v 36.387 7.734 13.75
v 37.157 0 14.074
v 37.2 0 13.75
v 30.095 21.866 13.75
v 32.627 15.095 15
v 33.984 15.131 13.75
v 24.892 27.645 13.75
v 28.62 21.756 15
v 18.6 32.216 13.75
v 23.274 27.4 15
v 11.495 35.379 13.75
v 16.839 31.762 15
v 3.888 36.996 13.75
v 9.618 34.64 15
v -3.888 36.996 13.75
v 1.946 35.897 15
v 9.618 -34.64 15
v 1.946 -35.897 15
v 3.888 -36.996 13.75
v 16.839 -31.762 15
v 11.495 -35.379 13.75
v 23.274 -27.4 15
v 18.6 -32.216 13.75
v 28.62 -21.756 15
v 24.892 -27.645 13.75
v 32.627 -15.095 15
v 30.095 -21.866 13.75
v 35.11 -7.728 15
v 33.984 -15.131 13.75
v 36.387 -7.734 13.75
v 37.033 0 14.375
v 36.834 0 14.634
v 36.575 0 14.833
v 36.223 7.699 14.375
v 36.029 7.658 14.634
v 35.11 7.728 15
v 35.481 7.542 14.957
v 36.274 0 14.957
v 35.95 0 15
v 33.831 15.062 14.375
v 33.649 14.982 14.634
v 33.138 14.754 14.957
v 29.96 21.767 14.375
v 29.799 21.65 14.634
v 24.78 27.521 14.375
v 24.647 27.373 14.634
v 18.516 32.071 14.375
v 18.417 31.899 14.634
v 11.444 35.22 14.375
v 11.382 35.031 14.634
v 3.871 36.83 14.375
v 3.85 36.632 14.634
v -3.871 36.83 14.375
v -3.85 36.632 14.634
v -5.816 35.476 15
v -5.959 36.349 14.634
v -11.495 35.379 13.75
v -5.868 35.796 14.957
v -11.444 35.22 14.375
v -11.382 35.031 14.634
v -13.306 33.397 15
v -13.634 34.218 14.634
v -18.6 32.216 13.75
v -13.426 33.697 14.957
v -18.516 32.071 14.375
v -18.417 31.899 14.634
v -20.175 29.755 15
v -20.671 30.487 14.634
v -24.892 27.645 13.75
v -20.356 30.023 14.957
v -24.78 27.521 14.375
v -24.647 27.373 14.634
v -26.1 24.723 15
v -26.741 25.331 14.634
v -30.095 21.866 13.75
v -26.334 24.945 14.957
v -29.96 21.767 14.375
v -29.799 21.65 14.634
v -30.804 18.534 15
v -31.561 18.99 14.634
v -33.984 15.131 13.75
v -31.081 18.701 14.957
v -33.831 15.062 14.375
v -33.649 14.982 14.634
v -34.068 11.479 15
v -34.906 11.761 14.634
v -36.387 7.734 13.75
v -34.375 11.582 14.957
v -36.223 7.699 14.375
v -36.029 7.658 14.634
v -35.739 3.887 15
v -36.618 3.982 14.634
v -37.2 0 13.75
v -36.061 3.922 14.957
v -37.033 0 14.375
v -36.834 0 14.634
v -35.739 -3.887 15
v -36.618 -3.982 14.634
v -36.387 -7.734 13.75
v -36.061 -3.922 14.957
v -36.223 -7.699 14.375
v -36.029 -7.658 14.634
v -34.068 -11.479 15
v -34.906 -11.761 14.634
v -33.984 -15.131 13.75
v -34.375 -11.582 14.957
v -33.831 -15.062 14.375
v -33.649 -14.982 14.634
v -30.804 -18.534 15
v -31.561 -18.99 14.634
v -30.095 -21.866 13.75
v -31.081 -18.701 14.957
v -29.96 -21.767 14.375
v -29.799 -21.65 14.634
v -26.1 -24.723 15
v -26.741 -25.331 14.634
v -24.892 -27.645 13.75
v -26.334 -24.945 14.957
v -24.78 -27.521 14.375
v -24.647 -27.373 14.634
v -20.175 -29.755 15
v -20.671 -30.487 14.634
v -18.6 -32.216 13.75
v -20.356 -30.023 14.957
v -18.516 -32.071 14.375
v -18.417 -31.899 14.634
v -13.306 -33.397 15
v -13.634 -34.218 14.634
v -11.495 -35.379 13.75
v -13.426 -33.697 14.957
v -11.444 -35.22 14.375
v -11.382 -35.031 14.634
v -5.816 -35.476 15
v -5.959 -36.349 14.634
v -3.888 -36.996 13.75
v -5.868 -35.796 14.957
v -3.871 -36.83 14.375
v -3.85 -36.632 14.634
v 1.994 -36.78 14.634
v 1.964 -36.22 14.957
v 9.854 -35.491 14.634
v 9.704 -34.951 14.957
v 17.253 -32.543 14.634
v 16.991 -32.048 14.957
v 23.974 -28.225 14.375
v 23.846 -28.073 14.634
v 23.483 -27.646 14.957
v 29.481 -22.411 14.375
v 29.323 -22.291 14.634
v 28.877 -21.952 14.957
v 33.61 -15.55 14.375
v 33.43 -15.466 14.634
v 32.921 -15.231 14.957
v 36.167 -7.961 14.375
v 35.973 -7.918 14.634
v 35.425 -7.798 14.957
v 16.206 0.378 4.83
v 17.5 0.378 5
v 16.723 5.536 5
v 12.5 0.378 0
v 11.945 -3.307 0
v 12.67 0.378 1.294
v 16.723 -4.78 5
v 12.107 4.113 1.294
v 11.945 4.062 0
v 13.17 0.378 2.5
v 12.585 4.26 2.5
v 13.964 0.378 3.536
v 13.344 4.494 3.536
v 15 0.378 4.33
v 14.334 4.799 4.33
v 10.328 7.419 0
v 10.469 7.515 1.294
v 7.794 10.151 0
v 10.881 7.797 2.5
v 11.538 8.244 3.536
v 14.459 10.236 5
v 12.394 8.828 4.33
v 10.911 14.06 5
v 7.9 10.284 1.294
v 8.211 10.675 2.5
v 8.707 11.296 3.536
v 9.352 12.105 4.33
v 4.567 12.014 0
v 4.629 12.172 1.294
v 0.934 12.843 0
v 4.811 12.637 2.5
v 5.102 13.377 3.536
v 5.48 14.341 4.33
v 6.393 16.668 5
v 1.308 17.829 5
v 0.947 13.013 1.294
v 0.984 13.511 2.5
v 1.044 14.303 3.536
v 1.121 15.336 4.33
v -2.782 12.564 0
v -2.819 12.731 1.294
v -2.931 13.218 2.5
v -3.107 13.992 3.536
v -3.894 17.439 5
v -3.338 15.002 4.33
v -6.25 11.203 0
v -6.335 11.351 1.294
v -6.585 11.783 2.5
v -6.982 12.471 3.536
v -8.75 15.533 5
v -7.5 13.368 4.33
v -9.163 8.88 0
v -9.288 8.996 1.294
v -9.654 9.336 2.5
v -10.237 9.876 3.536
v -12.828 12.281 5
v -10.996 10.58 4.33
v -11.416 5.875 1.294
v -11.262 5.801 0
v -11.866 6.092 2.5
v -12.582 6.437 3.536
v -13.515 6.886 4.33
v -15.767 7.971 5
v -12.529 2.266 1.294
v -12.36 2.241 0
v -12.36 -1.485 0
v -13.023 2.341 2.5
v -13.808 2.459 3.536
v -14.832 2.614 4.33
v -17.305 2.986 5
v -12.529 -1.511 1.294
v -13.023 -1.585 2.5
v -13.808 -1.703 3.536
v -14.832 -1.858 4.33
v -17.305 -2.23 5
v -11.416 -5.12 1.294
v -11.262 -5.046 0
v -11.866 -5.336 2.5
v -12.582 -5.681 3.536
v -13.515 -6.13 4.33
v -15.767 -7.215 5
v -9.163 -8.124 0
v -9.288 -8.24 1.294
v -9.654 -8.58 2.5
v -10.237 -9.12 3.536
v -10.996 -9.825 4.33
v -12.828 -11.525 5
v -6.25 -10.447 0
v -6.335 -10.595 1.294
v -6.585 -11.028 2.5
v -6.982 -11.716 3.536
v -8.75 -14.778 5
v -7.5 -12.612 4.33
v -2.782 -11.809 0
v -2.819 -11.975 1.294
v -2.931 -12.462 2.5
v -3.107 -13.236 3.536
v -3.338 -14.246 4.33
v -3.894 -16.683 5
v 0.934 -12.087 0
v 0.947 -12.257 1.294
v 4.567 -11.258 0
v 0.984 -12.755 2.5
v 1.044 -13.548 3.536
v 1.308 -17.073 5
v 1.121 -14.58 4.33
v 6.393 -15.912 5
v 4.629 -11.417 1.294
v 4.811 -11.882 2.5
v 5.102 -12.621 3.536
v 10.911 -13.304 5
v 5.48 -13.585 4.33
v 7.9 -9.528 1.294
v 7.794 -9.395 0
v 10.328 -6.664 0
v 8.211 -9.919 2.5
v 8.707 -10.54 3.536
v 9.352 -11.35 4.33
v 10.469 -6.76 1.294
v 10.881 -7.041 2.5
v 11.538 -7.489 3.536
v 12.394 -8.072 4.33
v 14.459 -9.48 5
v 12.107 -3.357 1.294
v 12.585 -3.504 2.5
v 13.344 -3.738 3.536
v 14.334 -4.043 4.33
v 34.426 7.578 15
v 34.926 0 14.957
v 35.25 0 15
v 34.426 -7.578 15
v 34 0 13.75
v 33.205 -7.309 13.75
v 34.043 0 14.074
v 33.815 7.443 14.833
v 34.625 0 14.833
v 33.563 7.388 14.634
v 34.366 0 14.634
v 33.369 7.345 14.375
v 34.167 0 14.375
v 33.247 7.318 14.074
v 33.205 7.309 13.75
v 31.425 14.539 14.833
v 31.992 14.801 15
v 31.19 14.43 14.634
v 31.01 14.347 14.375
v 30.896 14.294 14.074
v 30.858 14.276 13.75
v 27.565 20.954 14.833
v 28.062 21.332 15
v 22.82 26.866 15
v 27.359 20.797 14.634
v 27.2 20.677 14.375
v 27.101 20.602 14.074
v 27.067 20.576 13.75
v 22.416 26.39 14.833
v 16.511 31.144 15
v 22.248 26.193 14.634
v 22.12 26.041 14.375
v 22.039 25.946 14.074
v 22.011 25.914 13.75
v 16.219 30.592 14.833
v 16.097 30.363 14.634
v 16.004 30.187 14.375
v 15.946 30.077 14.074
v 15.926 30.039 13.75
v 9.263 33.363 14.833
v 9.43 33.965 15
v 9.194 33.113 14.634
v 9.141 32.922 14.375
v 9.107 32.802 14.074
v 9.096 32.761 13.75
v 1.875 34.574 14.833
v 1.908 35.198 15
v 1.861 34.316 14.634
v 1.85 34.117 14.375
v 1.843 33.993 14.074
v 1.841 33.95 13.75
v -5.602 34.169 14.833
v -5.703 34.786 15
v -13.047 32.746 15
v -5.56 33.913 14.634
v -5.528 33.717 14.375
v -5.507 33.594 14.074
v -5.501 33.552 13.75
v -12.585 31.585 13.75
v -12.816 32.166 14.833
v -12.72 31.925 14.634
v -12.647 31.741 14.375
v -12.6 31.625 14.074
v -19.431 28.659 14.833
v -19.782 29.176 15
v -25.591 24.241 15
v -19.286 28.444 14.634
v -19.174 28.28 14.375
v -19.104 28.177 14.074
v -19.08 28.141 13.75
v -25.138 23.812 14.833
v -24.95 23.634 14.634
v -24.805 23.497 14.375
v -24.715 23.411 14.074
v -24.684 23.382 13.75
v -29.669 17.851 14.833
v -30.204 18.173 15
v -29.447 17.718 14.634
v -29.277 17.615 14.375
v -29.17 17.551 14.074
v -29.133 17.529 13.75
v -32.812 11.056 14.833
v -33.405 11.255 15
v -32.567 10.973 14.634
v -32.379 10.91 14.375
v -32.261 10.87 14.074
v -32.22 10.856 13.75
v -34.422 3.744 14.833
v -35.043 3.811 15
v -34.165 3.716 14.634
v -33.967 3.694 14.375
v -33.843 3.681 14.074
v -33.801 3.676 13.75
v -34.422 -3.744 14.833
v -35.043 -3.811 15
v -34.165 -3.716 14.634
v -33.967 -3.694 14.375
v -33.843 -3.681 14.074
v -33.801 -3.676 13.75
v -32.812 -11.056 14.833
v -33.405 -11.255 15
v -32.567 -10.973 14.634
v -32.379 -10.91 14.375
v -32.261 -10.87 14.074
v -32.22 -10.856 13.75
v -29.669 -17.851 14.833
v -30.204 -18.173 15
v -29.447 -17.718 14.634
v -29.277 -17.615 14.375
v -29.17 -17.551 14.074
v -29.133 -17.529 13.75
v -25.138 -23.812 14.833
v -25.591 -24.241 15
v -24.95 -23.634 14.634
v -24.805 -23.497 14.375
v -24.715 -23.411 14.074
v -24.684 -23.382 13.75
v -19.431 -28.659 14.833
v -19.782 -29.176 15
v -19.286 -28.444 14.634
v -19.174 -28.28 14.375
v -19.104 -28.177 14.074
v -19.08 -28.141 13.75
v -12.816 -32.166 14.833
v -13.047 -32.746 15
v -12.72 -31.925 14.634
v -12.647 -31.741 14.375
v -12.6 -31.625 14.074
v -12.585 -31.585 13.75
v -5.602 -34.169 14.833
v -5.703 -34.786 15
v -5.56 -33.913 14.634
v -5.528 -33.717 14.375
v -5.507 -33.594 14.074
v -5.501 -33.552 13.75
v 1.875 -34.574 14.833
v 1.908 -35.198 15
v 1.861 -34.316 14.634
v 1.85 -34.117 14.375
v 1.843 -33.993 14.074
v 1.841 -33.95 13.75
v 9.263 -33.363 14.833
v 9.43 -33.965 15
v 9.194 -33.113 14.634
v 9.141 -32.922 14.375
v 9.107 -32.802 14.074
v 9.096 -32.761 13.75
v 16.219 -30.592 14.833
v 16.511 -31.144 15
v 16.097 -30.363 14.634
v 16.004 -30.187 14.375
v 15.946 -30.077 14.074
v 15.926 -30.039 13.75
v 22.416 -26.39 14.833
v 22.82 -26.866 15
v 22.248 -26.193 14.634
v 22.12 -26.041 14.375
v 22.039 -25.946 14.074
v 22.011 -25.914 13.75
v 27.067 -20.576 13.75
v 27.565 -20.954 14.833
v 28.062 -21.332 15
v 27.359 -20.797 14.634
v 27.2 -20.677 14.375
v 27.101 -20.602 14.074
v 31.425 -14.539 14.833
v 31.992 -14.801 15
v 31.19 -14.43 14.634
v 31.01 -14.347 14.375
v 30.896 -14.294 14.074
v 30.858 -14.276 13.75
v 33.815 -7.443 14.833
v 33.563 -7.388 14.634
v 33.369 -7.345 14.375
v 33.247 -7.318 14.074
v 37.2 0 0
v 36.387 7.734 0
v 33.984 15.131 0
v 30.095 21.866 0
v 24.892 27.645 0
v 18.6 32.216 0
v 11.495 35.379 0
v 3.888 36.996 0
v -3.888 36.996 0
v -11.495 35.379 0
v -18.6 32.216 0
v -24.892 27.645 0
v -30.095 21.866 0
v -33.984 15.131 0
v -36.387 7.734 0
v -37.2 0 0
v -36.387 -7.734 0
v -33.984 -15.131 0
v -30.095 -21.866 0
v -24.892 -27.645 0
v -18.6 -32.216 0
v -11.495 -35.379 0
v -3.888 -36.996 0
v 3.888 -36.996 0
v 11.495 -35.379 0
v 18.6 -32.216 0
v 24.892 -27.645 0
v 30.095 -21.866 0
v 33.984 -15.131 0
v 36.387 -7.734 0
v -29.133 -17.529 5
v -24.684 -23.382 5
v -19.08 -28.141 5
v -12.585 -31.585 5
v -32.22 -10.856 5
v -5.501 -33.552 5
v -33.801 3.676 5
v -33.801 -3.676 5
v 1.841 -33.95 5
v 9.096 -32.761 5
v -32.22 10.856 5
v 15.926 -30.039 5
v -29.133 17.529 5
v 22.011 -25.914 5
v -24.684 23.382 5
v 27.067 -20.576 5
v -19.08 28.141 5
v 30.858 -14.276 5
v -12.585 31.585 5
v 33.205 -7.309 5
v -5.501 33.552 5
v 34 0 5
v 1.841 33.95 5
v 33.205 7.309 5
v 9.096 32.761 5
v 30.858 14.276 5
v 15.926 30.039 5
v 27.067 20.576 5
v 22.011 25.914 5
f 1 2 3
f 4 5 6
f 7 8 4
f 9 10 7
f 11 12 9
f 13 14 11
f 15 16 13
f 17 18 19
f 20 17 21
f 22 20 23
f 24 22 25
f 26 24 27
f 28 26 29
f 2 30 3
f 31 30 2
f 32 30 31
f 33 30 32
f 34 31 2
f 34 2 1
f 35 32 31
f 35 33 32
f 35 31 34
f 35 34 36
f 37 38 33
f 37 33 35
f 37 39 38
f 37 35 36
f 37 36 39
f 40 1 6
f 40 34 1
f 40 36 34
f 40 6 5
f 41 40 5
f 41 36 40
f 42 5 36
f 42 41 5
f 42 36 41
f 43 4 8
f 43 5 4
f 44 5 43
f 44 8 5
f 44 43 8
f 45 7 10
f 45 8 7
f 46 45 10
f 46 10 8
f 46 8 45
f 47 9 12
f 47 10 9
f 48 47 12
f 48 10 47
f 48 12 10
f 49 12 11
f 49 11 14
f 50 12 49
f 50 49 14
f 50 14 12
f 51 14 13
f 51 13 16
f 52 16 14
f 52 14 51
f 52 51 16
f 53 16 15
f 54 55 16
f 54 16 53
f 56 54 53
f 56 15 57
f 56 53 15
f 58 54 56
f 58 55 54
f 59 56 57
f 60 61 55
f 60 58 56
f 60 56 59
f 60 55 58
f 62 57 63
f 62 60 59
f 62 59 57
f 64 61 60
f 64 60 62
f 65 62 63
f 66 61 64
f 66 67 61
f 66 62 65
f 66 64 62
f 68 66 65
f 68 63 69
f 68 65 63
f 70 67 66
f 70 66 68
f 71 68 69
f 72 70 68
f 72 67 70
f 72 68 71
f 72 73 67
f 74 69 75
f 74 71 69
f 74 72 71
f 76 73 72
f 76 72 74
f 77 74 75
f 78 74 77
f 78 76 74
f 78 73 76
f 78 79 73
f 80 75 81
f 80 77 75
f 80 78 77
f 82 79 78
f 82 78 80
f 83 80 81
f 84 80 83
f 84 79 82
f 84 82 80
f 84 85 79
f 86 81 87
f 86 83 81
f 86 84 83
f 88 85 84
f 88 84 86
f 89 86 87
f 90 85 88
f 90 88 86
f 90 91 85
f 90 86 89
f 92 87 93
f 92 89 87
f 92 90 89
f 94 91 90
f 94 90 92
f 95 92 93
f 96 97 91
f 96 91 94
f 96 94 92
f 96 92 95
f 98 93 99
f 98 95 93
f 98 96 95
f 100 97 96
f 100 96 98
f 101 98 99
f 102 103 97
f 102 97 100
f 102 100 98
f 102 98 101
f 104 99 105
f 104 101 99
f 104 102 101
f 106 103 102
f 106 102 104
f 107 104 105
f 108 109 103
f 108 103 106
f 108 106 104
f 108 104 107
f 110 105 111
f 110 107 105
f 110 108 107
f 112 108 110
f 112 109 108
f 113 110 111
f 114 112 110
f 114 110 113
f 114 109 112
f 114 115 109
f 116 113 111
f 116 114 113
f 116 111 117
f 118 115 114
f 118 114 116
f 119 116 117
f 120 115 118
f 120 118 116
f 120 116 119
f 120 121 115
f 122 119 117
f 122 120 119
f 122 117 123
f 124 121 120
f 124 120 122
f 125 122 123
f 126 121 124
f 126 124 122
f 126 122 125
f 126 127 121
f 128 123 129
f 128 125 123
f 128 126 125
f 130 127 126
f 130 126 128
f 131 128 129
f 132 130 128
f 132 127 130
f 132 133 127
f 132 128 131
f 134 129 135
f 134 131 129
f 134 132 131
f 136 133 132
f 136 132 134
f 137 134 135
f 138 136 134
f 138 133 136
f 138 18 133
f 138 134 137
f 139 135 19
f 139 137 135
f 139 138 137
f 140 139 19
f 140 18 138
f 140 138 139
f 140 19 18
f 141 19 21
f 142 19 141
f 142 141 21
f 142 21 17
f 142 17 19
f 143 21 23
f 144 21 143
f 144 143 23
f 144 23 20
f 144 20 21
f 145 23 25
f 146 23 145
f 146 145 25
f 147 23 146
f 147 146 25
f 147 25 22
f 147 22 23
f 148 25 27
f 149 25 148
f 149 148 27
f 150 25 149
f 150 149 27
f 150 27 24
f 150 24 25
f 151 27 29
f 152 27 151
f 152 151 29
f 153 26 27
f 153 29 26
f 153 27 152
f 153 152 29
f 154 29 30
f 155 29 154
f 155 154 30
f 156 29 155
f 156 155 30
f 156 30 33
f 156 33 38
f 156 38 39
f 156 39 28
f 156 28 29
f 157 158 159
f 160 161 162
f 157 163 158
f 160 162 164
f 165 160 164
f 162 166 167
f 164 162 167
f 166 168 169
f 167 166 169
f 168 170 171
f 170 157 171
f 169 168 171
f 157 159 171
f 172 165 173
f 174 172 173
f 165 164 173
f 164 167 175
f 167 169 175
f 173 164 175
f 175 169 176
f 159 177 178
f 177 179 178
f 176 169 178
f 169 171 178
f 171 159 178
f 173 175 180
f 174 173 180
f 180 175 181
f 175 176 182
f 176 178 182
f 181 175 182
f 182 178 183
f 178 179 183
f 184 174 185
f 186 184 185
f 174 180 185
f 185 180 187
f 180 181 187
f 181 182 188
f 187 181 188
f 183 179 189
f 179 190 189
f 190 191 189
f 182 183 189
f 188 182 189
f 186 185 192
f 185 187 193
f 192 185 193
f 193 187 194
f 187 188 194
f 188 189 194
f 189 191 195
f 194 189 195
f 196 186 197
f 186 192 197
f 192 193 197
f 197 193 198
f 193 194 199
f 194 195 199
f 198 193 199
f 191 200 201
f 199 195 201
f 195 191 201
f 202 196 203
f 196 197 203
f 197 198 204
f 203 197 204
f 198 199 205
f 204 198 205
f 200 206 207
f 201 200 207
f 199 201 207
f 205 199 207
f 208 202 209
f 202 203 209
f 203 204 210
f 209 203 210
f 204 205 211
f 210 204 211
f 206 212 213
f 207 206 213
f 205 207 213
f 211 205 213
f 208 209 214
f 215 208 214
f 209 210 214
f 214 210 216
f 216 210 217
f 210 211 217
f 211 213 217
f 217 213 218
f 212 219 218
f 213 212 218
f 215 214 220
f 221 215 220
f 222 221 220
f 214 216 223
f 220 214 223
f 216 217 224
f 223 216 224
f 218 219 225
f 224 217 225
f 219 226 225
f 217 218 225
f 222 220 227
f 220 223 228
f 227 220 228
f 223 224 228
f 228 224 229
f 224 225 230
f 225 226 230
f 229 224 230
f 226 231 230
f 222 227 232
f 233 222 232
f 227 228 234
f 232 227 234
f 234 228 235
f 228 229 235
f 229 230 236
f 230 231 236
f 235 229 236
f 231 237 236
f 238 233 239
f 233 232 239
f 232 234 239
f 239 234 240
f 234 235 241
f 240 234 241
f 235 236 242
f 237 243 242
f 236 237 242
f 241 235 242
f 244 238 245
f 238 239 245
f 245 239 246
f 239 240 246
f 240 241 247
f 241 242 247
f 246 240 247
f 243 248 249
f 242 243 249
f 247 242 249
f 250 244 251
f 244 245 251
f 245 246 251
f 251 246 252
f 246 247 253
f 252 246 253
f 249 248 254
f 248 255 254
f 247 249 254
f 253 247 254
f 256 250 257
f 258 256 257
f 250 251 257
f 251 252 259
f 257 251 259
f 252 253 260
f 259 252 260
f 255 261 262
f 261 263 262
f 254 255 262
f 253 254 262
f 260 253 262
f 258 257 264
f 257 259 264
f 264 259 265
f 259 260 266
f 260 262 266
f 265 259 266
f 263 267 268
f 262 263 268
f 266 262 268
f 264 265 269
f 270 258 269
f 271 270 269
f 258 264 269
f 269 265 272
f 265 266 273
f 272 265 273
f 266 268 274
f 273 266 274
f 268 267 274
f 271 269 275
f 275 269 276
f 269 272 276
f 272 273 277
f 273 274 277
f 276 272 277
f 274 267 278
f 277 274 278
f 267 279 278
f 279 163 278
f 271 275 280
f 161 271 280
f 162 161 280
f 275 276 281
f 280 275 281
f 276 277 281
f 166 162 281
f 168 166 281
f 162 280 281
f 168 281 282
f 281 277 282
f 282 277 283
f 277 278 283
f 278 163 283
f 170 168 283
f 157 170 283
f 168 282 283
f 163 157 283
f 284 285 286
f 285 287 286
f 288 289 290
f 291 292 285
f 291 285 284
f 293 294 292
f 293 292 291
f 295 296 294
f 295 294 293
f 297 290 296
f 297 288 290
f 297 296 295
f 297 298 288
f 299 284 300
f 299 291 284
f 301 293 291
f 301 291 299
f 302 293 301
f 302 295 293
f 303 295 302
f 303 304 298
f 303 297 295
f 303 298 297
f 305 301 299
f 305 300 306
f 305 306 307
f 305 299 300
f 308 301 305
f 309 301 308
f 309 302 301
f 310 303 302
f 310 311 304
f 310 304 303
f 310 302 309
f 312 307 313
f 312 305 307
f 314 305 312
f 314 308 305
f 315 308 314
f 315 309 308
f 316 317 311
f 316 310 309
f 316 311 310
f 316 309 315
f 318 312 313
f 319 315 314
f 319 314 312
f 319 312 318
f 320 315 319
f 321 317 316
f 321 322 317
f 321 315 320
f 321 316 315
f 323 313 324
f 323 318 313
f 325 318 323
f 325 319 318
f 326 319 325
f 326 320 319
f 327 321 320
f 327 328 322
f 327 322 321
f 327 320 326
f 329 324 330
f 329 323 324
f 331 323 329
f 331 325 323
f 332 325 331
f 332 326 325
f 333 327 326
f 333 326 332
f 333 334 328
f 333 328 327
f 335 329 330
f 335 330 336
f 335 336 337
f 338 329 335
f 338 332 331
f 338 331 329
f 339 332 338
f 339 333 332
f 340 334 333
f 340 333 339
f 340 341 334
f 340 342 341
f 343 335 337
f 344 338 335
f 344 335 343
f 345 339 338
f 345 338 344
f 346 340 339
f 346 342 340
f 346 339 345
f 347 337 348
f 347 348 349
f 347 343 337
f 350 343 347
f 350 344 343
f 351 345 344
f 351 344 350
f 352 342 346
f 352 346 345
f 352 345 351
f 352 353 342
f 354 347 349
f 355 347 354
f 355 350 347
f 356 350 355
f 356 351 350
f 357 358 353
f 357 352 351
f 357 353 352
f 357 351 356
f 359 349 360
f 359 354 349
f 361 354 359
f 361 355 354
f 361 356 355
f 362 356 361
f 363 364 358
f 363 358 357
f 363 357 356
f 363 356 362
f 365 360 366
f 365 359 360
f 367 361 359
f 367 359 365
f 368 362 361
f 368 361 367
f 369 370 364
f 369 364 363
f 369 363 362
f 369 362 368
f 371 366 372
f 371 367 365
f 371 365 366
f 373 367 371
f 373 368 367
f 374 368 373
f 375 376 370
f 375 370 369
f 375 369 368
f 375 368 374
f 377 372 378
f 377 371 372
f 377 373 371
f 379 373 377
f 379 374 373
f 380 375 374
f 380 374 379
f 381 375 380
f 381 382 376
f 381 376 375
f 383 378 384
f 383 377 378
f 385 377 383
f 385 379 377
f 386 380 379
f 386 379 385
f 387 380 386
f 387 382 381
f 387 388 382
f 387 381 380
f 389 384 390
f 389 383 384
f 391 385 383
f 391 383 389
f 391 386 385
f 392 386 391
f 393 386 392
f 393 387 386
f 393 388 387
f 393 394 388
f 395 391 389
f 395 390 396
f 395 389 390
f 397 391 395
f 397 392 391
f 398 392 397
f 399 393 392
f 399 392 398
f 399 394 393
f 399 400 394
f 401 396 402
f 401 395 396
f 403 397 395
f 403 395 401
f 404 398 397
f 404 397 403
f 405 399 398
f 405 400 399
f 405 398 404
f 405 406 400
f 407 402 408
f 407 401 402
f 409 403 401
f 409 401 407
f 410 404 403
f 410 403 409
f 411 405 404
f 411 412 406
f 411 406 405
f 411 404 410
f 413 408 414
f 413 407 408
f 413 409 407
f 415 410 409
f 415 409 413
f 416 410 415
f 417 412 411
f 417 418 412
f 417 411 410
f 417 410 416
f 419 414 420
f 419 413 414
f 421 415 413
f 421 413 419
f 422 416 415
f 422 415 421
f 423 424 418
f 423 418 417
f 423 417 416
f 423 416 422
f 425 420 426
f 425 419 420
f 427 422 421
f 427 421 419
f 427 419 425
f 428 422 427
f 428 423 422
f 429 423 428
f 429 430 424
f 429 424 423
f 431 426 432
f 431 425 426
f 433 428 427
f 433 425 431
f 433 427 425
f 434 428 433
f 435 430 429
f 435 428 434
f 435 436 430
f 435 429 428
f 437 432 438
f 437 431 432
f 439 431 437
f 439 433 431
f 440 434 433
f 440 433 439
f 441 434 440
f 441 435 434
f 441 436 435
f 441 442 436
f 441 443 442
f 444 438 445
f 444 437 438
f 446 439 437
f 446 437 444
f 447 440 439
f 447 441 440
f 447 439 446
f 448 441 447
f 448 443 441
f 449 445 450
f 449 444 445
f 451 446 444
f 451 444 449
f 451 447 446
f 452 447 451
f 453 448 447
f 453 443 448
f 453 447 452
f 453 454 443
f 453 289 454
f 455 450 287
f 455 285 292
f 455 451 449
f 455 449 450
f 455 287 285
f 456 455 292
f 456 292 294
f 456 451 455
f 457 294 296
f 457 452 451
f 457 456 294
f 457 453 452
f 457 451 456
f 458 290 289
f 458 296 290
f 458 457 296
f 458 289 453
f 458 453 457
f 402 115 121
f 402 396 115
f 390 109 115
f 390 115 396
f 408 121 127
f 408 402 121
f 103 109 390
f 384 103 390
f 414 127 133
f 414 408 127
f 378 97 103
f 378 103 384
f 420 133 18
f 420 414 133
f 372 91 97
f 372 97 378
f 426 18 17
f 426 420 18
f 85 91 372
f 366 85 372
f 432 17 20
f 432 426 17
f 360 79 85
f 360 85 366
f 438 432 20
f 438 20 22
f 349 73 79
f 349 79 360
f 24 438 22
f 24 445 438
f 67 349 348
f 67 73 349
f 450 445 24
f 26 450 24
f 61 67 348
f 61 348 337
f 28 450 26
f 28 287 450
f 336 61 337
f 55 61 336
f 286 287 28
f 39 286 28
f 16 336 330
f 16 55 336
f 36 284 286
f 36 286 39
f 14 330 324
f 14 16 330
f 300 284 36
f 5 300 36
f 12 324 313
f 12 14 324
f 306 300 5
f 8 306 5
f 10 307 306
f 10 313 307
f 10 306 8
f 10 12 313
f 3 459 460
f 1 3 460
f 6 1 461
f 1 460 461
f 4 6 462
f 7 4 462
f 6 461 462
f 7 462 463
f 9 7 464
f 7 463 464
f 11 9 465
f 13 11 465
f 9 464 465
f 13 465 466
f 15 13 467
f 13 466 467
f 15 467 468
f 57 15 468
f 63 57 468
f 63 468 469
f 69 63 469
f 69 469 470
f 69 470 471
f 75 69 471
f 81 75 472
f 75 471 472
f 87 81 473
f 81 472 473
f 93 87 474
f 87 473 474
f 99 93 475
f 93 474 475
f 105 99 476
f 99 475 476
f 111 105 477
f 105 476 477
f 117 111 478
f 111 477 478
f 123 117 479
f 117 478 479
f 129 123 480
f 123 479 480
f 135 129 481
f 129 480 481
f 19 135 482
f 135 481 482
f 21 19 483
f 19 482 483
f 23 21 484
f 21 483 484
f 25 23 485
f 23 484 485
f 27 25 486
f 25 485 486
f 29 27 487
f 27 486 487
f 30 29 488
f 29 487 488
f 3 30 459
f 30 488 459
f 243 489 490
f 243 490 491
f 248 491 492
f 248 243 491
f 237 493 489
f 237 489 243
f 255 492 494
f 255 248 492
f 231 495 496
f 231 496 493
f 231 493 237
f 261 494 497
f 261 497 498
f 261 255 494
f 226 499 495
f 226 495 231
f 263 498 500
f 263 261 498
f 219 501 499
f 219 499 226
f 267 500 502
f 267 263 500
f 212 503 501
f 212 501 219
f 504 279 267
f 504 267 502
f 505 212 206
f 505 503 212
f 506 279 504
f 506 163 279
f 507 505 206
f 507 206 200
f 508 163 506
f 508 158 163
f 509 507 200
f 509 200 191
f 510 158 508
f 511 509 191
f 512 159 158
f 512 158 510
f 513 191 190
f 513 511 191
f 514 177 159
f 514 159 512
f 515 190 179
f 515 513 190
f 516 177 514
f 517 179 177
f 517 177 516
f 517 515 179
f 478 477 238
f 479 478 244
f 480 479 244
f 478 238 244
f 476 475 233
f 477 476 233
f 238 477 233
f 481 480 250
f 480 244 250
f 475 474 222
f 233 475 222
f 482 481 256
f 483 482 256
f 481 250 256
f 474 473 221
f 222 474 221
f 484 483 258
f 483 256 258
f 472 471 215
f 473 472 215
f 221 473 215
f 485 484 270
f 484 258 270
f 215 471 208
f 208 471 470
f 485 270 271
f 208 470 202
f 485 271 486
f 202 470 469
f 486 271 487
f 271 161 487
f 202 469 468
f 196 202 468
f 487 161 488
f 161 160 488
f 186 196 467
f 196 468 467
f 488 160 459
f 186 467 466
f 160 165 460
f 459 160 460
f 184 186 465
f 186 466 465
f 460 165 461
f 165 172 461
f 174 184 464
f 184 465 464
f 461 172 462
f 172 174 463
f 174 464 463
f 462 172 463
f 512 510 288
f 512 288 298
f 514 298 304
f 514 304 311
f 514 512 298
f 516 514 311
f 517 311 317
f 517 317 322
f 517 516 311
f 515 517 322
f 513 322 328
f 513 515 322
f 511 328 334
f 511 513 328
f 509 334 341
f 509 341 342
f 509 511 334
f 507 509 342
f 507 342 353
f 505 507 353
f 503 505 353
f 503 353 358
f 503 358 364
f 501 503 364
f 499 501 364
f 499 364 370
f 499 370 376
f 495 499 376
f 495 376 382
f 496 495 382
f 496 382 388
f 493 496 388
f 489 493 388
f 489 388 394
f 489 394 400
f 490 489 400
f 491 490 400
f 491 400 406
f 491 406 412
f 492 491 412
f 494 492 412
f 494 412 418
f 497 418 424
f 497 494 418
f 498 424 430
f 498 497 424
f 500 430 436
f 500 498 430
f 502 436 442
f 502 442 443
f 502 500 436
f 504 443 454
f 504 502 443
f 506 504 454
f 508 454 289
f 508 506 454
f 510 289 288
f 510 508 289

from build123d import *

# Parameters (mm, degrees)
F0_R     = 34
F0_R_2   = 12.5
F1_DEPTH = 5
F0_R_3   = 37.2
F2_DEPTH = 15
F3_R     = 1.25
F4_R     = 4.99999


# Not quite as in the source:
# - a fillet or chamfer is up to 0.001 mm smaller than in the source, because OpenCascade refuses the exact size


with BuildPart() as f1:
    # F0 (on Top) → F1 (new body)
    with BuildSketch(Plane.XY):
        Circle(F0_R)
        with Locations((0, 0.3778987616)):
            Circle(F0_R_2, mode=Mode.SUBTRACT)
    extrude(amount=F1_DEPTH)

    # F0 (on Top) → F2 (join)
    with BuildSketch(Plane.XY):
        Circle(F0_R_3)
        Circle(F0_R, mode=Mode.SUBTRACT)
    extrude(amount=F2_DEPTH)

    # F3
    f3_edges = [f1.edges().sort_by_distance(p)[0] for p in [
        (-34, 0, 15),
        (-37.2, 0, 15),
    ]]
    fillet(f3_edges, radius=F3_R)

    # F4 (radius 5 in the source; OpenCascade refuses exactly that, so slightly less here)
    f4_edges = [f1.edges().sort_by_distance(p)[0] for p in [
        (-12.5, 0.377899, 5),
    ]]
    fillet(f4_edges, radius=F4_R)


solid = f1.part
